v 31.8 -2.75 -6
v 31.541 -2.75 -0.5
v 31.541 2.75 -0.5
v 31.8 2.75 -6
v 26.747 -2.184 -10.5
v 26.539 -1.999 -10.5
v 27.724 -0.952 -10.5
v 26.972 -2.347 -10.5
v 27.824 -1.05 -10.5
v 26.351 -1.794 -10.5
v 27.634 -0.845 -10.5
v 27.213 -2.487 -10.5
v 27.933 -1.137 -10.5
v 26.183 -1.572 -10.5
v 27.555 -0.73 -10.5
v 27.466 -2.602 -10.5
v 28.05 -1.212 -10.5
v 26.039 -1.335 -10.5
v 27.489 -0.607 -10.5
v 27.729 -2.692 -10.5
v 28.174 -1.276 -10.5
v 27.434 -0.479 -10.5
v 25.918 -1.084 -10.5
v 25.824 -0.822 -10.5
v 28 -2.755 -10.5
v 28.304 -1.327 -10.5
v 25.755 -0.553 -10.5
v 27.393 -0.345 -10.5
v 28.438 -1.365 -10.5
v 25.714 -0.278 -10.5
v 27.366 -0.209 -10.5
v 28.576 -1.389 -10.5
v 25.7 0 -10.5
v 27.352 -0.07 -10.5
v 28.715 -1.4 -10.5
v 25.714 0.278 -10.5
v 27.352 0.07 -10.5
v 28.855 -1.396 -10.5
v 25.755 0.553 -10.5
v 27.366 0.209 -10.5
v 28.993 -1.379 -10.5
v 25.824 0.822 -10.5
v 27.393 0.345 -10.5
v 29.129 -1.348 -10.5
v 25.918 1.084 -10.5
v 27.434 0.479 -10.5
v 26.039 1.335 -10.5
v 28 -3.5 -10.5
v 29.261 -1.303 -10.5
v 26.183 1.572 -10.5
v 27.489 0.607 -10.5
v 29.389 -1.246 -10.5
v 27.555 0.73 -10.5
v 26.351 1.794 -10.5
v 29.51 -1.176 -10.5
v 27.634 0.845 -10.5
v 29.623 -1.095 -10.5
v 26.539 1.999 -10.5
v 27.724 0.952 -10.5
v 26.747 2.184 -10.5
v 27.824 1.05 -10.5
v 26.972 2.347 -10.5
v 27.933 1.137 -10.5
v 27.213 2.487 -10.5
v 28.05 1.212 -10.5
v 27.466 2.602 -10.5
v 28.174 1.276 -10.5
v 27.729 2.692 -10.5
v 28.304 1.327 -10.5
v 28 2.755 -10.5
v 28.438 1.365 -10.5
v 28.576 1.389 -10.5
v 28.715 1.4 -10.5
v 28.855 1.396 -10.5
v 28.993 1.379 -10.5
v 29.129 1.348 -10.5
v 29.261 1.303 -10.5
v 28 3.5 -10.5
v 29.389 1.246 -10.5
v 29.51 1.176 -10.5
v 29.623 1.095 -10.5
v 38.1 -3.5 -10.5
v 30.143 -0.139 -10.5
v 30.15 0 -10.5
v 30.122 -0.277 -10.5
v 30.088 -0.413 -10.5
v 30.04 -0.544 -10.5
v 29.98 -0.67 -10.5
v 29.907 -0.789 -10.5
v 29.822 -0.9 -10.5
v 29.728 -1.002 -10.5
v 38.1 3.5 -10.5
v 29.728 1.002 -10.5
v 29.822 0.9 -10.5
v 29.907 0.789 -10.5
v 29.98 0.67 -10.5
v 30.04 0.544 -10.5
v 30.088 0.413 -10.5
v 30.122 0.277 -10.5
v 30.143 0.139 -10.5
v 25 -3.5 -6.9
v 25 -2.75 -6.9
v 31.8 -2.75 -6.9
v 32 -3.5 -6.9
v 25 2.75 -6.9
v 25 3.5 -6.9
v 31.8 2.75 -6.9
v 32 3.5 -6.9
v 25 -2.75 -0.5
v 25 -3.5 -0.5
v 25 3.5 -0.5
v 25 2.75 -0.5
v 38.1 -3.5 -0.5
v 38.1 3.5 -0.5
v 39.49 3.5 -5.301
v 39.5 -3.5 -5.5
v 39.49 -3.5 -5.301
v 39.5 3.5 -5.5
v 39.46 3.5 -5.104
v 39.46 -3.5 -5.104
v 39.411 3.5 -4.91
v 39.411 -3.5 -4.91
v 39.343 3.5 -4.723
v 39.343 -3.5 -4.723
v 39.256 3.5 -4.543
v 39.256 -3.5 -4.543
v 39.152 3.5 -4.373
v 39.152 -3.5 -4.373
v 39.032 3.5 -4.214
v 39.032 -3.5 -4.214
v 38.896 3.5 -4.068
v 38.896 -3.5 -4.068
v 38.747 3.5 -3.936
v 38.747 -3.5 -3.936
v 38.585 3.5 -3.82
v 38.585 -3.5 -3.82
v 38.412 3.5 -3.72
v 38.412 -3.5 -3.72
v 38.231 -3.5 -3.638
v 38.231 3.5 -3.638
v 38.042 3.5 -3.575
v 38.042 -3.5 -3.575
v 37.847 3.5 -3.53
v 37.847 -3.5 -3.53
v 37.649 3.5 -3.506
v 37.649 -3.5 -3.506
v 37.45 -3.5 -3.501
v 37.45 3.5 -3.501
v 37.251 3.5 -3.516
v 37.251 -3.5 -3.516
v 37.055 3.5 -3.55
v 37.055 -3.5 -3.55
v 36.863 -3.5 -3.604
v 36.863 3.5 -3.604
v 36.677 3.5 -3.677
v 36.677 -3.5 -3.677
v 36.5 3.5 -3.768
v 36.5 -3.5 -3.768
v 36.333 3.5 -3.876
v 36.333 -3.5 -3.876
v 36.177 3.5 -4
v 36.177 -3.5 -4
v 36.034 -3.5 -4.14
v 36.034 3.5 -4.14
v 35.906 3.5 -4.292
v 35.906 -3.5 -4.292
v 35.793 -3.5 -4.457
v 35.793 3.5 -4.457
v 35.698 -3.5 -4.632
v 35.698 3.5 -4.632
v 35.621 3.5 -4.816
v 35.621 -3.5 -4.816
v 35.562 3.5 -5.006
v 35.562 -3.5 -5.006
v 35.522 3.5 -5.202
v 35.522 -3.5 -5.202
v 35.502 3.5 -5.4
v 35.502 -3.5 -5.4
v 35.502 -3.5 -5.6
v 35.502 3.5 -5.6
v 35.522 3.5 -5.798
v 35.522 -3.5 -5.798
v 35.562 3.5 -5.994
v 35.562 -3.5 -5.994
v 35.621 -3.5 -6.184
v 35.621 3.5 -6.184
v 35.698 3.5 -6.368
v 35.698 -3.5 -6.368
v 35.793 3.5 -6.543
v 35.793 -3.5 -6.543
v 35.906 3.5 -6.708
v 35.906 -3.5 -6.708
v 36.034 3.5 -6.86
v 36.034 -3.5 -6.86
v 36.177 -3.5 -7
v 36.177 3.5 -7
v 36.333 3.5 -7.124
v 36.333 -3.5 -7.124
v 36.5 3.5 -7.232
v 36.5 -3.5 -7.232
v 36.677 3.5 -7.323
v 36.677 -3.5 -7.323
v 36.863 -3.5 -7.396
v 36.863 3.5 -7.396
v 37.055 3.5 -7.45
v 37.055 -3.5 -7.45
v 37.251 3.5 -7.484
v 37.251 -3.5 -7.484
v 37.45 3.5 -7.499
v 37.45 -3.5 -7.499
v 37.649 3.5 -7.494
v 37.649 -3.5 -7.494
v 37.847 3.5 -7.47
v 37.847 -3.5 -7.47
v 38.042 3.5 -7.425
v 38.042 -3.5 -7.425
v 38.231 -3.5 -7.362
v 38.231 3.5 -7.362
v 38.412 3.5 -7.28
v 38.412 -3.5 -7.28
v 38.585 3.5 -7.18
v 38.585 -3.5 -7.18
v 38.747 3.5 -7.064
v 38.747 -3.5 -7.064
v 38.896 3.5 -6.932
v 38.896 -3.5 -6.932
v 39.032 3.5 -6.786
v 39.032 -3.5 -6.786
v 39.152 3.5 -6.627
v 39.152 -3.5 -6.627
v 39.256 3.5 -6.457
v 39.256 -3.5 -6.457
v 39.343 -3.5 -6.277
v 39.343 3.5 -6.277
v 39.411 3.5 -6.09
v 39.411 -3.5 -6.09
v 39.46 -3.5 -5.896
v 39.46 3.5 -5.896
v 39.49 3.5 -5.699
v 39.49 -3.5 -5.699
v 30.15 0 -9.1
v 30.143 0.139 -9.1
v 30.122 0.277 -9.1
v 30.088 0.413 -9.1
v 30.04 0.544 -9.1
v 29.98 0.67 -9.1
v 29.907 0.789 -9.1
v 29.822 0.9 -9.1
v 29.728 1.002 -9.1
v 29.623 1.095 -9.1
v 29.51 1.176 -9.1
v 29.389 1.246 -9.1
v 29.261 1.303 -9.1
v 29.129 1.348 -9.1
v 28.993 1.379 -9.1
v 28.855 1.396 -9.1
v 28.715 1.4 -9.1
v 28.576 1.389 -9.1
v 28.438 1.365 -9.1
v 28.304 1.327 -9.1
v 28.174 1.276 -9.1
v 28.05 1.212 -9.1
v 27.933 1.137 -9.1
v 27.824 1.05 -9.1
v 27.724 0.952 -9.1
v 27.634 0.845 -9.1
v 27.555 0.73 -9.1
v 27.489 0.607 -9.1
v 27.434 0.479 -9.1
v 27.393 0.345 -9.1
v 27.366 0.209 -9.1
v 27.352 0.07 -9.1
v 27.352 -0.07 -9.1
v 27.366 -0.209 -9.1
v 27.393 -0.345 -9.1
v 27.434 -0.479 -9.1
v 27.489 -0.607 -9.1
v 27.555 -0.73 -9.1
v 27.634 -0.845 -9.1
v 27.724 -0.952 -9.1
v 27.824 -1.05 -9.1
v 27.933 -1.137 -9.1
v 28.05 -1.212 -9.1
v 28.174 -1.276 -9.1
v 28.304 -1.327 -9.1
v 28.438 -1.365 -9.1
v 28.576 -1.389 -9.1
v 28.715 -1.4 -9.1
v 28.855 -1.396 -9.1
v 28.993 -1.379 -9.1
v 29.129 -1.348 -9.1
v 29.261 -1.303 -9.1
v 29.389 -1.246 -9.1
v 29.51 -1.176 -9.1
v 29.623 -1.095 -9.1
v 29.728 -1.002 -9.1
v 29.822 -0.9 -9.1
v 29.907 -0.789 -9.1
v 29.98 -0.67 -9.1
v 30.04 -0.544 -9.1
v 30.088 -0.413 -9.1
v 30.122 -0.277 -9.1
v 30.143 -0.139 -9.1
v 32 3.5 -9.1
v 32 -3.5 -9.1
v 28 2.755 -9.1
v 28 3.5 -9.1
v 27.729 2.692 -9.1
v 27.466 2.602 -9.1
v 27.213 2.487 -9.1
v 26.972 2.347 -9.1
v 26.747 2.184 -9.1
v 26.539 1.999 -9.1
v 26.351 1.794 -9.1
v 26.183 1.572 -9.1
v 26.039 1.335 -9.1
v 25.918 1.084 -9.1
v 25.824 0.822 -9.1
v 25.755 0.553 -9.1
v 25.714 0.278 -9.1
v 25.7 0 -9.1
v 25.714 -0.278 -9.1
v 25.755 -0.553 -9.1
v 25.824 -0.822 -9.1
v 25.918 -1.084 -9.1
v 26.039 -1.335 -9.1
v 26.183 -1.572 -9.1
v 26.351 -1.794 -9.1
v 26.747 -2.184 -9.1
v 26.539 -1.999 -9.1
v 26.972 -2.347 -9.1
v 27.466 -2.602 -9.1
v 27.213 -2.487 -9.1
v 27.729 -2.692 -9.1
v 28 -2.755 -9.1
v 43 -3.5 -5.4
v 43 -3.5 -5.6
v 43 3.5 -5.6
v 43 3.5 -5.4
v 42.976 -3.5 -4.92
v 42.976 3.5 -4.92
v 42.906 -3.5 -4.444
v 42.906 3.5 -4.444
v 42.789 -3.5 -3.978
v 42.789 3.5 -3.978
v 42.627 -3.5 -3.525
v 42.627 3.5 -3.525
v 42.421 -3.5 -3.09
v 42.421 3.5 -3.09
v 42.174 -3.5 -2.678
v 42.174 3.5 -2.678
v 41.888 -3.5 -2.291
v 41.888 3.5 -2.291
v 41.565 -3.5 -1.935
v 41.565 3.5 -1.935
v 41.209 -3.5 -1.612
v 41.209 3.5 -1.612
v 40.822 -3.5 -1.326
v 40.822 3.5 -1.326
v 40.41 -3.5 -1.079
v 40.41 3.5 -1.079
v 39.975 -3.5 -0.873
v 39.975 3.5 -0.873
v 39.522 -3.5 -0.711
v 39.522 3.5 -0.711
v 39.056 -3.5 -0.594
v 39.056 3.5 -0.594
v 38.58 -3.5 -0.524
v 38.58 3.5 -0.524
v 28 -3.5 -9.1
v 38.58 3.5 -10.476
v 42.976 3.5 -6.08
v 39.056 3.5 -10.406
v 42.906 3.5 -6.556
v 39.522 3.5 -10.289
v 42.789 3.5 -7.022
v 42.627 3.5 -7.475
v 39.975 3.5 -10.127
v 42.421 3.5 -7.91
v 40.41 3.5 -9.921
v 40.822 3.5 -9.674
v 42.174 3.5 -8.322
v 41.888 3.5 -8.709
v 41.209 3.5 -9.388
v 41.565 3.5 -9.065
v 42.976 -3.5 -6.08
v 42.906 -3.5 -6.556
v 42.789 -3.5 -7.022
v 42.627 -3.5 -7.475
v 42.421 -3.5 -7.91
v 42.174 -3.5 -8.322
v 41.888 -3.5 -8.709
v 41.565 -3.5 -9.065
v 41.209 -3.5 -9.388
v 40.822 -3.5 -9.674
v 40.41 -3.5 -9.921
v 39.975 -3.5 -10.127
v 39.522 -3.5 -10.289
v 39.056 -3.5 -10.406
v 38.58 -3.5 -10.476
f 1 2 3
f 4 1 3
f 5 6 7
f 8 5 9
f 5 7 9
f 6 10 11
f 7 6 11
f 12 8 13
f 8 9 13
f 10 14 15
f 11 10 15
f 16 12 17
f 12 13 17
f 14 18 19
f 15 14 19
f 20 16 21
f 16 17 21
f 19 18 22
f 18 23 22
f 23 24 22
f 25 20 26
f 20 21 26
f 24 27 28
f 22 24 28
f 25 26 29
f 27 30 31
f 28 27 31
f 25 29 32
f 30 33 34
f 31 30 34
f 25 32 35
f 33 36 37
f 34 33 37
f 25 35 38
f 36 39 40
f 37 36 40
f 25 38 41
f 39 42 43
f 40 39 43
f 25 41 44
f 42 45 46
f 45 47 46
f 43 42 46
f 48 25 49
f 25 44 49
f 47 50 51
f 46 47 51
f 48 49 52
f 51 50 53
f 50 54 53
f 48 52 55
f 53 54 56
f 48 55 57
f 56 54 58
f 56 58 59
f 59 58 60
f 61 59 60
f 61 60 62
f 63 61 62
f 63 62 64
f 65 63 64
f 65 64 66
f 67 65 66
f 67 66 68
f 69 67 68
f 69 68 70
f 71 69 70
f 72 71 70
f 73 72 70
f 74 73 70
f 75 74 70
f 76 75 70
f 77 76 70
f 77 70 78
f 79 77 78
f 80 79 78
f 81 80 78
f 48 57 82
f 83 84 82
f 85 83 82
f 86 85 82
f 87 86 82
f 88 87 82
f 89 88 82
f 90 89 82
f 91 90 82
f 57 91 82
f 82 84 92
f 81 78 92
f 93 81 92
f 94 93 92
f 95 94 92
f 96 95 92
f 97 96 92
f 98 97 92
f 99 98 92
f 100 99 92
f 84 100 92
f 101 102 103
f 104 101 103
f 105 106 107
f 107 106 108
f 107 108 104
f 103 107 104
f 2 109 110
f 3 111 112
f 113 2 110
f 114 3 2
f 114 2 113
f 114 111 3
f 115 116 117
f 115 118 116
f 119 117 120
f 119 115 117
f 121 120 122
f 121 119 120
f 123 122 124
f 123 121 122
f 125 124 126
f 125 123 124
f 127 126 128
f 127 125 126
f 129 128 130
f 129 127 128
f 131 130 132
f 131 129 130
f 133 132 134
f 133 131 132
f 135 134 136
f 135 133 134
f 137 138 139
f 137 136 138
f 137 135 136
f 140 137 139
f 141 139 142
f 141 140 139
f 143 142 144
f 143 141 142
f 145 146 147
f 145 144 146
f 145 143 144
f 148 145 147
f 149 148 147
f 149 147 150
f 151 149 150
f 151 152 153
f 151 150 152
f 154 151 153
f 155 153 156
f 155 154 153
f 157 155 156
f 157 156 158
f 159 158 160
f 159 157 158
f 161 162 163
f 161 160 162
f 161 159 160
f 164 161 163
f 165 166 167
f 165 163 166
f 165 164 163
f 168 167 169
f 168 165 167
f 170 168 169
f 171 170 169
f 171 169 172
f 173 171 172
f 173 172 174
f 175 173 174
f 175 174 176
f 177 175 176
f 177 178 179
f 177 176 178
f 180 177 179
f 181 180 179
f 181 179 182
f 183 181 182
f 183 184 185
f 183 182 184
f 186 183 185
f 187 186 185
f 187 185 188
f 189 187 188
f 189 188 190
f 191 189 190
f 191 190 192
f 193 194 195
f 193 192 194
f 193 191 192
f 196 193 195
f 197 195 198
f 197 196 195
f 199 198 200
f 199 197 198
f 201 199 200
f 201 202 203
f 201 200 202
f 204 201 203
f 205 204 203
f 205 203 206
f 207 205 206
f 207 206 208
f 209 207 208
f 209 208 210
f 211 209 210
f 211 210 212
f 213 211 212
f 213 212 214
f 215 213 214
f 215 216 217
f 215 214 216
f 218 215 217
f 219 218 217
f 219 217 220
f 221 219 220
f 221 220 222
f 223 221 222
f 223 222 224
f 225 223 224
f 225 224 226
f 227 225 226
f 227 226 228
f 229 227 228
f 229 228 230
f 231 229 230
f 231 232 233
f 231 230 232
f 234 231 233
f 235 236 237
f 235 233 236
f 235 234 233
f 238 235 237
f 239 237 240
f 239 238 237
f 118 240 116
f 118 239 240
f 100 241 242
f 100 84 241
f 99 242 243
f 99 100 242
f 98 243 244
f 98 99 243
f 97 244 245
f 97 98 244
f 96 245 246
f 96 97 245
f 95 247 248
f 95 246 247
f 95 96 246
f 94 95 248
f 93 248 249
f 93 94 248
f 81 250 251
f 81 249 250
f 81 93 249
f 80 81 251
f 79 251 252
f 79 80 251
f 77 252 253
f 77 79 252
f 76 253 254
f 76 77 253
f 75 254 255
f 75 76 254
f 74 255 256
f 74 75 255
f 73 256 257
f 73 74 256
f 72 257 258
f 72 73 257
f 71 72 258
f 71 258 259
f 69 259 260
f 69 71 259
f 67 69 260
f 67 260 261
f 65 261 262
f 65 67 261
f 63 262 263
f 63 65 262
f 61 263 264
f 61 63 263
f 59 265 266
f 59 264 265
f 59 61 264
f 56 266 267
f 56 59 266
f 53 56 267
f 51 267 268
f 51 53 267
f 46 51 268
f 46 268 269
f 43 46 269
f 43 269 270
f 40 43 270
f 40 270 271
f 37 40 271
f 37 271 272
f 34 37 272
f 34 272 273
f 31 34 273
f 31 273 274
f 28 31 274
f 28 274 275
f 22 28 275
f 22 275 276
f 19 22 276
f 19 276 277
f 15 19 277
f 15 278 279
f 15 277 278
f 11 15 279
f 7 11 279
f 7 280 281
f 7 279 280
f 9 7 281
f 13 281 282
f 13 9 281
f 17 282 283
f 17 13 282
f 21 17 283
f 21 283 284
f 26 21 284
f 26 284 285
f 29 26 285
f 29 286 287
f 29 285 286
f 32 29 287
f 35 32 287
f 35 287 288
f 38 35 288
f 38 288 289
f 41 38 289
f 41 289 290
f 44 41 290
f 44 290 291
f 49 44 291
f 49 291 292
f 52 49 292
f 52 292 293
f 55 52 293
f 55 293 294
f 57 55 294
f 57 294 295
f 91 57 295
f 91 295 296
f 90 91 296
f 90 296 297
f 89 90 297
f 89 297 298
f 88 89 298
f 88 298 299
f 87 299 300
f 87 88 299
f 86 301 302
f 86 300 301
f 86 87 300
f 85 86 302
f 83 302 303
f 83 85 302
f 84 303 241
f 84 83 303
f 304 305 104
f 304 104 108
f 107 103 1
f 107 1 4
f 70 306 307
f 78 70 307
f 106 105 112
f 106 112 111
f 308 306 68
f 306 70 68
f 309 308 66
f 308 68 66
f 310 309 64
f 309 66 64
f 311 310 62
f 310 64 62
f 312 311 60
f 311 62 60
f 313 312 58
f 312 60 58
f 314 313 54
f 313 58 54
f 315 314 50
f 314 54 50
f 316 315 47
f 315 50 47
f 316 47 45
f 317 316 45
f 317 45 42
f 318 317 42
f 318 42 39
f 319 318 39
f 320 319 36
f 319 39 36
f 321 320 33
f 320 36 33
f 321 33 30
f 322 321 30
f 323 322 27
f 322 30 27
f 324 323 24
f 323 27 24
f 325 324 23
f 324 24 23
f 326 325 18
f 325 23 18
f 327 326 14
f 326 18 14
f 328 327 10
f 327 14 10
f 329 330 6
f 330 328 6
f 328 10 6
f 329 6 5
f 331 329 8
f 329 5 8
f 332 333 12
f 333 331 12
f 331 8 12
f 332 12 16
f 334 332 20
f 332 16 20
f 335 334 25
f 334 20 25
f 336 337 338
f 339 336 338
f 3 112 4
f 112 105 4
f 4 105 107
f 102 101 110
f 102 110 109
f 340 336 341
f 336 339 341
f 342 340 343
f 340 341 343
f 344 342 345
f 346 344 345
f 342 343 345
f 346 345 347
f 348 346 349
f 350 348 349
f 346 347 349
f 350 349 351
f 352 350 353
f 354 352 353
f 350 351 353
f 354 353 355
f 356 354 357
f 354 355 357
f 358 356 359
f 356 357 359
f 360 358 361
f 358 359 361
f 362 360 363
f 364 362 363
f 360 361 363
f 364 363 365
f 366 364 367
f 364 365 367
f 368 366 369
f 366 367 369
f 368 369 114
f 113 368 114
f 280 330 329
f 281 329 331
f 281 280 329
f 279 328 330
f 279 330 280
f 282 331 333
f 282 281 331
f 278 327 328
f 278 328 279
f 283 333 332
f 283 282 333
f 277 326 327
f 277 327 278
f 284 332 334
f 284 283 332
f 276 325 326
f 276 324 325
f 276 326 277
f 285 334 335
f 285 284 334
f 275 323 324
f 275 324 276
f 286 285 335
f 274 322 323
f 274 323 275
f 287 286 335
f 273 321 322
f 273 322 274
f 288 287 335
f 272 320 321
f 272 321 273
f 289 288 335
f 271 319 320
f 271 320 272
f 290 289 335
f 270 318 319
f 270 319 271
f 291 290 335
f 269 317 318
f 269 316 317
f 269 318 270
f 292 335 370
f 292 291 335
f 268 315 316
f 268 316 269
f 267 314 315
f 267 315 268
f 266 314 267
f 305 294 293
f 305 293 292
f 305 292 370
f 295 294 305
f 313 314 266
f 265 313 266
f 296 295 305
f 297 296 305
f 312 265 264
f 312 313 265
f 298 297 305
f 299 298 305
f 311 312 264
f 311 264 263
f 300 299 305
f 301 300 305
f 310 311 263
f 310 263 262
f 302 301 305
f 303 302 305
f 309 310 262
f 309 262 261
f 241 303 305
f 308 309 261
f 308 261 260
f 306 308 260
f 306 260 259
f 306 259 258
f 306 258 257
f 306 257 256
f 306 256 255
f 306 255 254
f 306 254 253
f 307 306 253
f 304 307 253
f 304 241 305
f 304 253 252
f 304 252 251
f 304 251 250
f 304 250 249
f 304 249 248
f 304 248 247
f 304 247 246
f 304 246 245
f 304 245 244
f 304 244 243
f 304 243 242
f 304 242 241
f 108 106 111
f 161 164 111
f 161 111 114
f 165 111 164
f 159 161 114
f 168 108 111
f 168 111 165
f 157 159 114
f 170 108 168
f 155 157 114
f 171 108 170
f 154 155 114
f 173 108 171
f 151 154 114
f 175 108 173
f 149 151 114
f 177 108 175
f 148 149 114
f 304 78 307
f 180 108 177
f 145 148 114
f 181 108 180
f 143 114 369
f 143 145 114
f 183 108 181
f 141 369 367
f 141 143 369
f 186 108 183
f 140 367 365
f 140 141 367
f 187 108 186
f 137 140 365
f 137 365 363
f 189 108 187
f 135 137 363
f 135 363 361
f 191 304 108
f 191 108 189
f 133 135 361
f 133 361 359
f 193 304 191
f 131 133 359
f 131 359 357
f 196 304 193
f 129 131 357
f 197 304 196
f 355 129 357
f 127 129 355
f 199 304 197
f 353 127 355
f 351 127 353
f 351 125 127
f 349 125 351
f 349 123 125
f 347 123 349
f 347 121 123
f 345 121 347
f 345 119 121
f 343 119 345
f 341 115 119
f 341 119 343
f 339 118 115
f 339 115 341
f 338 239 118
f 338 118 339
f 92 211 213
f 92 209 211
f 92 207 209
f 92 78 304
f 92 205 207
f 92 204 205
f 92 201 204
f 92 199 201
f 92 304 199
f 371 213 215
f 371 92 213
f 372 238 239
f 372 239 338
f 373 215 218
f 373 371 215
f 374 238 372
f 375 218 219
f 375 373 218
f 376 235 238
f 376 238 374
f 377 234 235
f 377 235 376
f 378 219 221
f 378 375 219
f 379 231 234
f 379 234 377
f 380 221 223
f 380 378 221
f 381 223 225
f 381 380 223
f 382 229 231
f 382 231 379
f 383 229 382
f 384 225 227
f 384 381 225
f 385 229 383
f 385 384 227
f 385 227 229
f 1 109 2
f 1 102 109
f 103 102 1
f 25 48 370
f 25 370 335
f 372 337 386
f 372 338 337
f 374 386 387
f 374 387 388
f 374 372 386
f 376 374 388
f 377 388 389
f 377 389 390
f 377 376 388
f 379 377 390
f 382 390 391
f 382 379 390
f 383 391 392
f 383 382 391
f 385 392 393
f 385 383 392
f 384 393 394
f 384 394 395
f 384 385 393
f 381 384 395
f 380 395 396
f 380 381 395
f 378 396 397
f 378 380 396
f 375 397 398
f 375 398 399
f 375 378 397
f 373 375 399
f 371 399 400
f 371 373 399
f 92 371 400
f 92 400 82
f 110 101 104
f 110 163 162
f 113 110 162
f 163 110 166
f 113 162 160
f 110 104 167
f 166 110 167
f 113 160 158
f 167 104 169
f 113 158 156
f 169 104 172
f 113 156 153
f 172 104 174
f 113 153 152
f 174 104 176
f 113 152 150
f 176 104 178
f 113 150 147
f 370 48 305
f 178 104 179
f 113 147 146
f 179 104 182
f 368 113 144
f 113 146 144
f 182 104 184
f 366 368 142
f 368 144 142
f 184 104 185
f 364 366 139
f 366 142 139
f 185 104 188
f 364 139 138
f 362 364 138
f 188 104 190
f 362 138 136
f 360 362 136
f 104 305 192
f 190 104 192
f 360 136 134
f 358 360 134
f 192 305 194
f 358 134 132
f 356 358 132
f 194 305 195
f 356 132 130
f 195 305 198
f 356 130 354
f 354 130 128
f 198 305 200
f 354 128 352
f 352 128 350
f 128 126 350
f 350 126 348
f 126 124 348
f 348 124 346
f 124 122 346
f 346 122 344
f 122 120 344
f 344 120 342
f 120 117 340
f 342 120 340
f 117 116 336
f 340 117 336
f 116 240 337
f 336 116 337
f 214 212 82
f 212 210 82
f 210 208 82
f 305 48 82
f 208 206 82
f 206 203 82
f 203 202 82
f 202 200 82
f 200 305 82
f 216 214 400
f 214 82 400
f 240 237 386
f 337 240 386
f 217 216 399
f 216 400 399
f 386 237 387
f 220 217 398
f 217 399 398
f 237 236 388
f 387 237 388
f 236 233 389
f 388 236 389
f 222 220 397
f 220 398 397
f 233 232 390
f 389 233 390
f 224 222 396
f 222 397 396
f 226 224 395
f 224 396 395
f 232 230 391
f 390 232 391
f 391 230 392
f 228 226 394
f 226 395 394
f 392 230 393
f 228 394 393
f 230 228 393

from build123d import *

# Parameters (mm, degrees)
CYLINDER241_R      = 2.8
CYLINDER241_DEPTH  = 10
BOX164_W           = 7
BOX164_H           = 10
BOX164_DEPTH       = 3
BOX161_W           = 10
BOX161_H           = 10
BOX161_DEPTH       = 2.2
BOX160_W           = 10
BOX160_H           = 5.5
BOX160_DEPTH       = 18
CHAMFER023_1_SIZE2 = 4
CHAMFER023_1_SIZE  = 17
CHAMFER023_2_SIZE2 = 0.8
CHAMFER023_2_SIZE  = 17
CYLINDER238_R      = 1.4
CYLINDER238_DEPTH  = 19
CYLINDER239_R      = 2
CYLINDER239_DEPTH  = 10
BOX159_W           = 18
BOX159_H           = 7
BOX159_DEPTH       = 10
FILLET097_R        = 4.9


with BuildPart() as zylinder243:
    # Cylinder241 → Cylinder241 (new body)
    with BuildSketch(Plane(origin=(28.5, 0, -16.5), x_dir=(1, 0, 0), z_dir=(0, 0, 1))):
        Circle(CYLINDER241_R)
    extrude(amount=CYLINDER241_DEPTH)


with BuildPart() as cut111:
    # Box164 → Box164 (new body)
    with BuildSketch(Plane(origin=(21, -5, -12), x_dir=(1, 0, 0), z_dir=(0, 0, 1))):
        with Locations((3.5, 5)):
            Rectangle(BOX164_W, BOX164_H)
    extrude(amount=BOX164_DEPTH)

    # Cut111: cut Zylinder243
    add(zylinder243.part, mode=Mode.SUBTRACT)


with BuildPart() as w_rfel150:
    # Box161 → Box161 (new body)
    with BuildSketch(Plane(origin=(22, -5, -9.1), x_dir=(1, 0, 0), z_dir=(0, 0, 1))):
        with Locations((5, 5)):
            Rectangle(BOX161_W, BOX161_H)
    extrude(amount=BOX161_DEPTH)


with BuildPart() as chamfer023:
    # Box160 → Box160 (new body)
    with BuildSketch(Plane(origin=(21.8, -2.75, -7), x_dir=(1, 0, 0), z_dir=(0, 0, 1))):
        with Locations((5, 2.75)):
            Rectangle(BOX160_W, BOX160_H)
    extrude(amount=BOX160_DEPTH)

    # Chamfer023 1
    chamfer023_1_edges = [chamfer023.edges().sort_by_distance(p)[0] for p in [
        (21.8, 0, 11),
    ]]
    chamfer023_1_side = chamfer023.faces().sort_by_distance((21.8, 0, 2))[0]
    chamfer(chamfer023_1_edges, length=CHAMFER023_1_SIZE, length2=CHAMFER023_1_SIZE2, reference=chamfer023_1_side)

    # Chamfer023 2
    chamfer023_2_edges = [chamfer023.edges().sort_by_distance(p)[0] for p in [
        (31.8, 0, 11),
    ]]
    chamfer023_2_side = chamfer023.faces().sort_by_distance((31.8, 0, 2))[0]
    chamfer(chamfer023_2_edges, length=CHAMFER023_2_SIZE, length2=CHAMFER023_2_SIZE2, reference=chamfer023_2_side)


with BuildPart() as fusion158:
    # Cylinder238 → Cylinder238 (new body)
    with BuildSketch(Plane(origin=(28.75, 0, -11.5), x_dir=(1, 0, 0), z_dir=(0, 0, 1))):
        Circle(CYLINDER238_R)
    extrude(amount=CYLINDER238_DEPTH)

    # Fusion158: union Würfel150, Chamfer023
    add(w_rfel150.part)
    add(chamfer023.part)


with BuildPart() as fusion159:
    # Cylinder239 → Cylinder239 (new body)
    with BuildSketch(Plane(origin=(37.5, 5, -5.5), x_dir=(1, 0, 0), z_dir=(0, -1, 0))):
        Circle(CYLINDER239_R)
    extrude(amount=CYLINDER239_DEPTH)

    # Fusion159: union Fusion158
    add(fusion158.part)


with BuildPart() as cut112:
    # Box159 → Box159 (new body)
    with BuildSketch(Plane(origin=(25, -3.5, -10.5), x_dir=(1, 0, 0), z_dir=(0, 0, 1))):
        with Locations((9, 3.5)):
            Rectangle(BOX159_W, BOX159_H)
    extrude(amount=BOX159_DEPTH)

    # Fillet097
    fillet097_edges = [cut112.edges().sort_by_distance(p)[0] for p in [
        (43, 0, -0.5),
        (43, 0, -10.5),
    ]]
    fillet(fillet097_edges, radius=FILLET097_R)

    # Cut109: cut Fusion159
    add(fusion159.part, mode=Mode.SUBTRACT)

    # Cut112: cut Cut111
    add(cut111.part, mode=Mode.SUBTRACT)


solid = cut112.part
